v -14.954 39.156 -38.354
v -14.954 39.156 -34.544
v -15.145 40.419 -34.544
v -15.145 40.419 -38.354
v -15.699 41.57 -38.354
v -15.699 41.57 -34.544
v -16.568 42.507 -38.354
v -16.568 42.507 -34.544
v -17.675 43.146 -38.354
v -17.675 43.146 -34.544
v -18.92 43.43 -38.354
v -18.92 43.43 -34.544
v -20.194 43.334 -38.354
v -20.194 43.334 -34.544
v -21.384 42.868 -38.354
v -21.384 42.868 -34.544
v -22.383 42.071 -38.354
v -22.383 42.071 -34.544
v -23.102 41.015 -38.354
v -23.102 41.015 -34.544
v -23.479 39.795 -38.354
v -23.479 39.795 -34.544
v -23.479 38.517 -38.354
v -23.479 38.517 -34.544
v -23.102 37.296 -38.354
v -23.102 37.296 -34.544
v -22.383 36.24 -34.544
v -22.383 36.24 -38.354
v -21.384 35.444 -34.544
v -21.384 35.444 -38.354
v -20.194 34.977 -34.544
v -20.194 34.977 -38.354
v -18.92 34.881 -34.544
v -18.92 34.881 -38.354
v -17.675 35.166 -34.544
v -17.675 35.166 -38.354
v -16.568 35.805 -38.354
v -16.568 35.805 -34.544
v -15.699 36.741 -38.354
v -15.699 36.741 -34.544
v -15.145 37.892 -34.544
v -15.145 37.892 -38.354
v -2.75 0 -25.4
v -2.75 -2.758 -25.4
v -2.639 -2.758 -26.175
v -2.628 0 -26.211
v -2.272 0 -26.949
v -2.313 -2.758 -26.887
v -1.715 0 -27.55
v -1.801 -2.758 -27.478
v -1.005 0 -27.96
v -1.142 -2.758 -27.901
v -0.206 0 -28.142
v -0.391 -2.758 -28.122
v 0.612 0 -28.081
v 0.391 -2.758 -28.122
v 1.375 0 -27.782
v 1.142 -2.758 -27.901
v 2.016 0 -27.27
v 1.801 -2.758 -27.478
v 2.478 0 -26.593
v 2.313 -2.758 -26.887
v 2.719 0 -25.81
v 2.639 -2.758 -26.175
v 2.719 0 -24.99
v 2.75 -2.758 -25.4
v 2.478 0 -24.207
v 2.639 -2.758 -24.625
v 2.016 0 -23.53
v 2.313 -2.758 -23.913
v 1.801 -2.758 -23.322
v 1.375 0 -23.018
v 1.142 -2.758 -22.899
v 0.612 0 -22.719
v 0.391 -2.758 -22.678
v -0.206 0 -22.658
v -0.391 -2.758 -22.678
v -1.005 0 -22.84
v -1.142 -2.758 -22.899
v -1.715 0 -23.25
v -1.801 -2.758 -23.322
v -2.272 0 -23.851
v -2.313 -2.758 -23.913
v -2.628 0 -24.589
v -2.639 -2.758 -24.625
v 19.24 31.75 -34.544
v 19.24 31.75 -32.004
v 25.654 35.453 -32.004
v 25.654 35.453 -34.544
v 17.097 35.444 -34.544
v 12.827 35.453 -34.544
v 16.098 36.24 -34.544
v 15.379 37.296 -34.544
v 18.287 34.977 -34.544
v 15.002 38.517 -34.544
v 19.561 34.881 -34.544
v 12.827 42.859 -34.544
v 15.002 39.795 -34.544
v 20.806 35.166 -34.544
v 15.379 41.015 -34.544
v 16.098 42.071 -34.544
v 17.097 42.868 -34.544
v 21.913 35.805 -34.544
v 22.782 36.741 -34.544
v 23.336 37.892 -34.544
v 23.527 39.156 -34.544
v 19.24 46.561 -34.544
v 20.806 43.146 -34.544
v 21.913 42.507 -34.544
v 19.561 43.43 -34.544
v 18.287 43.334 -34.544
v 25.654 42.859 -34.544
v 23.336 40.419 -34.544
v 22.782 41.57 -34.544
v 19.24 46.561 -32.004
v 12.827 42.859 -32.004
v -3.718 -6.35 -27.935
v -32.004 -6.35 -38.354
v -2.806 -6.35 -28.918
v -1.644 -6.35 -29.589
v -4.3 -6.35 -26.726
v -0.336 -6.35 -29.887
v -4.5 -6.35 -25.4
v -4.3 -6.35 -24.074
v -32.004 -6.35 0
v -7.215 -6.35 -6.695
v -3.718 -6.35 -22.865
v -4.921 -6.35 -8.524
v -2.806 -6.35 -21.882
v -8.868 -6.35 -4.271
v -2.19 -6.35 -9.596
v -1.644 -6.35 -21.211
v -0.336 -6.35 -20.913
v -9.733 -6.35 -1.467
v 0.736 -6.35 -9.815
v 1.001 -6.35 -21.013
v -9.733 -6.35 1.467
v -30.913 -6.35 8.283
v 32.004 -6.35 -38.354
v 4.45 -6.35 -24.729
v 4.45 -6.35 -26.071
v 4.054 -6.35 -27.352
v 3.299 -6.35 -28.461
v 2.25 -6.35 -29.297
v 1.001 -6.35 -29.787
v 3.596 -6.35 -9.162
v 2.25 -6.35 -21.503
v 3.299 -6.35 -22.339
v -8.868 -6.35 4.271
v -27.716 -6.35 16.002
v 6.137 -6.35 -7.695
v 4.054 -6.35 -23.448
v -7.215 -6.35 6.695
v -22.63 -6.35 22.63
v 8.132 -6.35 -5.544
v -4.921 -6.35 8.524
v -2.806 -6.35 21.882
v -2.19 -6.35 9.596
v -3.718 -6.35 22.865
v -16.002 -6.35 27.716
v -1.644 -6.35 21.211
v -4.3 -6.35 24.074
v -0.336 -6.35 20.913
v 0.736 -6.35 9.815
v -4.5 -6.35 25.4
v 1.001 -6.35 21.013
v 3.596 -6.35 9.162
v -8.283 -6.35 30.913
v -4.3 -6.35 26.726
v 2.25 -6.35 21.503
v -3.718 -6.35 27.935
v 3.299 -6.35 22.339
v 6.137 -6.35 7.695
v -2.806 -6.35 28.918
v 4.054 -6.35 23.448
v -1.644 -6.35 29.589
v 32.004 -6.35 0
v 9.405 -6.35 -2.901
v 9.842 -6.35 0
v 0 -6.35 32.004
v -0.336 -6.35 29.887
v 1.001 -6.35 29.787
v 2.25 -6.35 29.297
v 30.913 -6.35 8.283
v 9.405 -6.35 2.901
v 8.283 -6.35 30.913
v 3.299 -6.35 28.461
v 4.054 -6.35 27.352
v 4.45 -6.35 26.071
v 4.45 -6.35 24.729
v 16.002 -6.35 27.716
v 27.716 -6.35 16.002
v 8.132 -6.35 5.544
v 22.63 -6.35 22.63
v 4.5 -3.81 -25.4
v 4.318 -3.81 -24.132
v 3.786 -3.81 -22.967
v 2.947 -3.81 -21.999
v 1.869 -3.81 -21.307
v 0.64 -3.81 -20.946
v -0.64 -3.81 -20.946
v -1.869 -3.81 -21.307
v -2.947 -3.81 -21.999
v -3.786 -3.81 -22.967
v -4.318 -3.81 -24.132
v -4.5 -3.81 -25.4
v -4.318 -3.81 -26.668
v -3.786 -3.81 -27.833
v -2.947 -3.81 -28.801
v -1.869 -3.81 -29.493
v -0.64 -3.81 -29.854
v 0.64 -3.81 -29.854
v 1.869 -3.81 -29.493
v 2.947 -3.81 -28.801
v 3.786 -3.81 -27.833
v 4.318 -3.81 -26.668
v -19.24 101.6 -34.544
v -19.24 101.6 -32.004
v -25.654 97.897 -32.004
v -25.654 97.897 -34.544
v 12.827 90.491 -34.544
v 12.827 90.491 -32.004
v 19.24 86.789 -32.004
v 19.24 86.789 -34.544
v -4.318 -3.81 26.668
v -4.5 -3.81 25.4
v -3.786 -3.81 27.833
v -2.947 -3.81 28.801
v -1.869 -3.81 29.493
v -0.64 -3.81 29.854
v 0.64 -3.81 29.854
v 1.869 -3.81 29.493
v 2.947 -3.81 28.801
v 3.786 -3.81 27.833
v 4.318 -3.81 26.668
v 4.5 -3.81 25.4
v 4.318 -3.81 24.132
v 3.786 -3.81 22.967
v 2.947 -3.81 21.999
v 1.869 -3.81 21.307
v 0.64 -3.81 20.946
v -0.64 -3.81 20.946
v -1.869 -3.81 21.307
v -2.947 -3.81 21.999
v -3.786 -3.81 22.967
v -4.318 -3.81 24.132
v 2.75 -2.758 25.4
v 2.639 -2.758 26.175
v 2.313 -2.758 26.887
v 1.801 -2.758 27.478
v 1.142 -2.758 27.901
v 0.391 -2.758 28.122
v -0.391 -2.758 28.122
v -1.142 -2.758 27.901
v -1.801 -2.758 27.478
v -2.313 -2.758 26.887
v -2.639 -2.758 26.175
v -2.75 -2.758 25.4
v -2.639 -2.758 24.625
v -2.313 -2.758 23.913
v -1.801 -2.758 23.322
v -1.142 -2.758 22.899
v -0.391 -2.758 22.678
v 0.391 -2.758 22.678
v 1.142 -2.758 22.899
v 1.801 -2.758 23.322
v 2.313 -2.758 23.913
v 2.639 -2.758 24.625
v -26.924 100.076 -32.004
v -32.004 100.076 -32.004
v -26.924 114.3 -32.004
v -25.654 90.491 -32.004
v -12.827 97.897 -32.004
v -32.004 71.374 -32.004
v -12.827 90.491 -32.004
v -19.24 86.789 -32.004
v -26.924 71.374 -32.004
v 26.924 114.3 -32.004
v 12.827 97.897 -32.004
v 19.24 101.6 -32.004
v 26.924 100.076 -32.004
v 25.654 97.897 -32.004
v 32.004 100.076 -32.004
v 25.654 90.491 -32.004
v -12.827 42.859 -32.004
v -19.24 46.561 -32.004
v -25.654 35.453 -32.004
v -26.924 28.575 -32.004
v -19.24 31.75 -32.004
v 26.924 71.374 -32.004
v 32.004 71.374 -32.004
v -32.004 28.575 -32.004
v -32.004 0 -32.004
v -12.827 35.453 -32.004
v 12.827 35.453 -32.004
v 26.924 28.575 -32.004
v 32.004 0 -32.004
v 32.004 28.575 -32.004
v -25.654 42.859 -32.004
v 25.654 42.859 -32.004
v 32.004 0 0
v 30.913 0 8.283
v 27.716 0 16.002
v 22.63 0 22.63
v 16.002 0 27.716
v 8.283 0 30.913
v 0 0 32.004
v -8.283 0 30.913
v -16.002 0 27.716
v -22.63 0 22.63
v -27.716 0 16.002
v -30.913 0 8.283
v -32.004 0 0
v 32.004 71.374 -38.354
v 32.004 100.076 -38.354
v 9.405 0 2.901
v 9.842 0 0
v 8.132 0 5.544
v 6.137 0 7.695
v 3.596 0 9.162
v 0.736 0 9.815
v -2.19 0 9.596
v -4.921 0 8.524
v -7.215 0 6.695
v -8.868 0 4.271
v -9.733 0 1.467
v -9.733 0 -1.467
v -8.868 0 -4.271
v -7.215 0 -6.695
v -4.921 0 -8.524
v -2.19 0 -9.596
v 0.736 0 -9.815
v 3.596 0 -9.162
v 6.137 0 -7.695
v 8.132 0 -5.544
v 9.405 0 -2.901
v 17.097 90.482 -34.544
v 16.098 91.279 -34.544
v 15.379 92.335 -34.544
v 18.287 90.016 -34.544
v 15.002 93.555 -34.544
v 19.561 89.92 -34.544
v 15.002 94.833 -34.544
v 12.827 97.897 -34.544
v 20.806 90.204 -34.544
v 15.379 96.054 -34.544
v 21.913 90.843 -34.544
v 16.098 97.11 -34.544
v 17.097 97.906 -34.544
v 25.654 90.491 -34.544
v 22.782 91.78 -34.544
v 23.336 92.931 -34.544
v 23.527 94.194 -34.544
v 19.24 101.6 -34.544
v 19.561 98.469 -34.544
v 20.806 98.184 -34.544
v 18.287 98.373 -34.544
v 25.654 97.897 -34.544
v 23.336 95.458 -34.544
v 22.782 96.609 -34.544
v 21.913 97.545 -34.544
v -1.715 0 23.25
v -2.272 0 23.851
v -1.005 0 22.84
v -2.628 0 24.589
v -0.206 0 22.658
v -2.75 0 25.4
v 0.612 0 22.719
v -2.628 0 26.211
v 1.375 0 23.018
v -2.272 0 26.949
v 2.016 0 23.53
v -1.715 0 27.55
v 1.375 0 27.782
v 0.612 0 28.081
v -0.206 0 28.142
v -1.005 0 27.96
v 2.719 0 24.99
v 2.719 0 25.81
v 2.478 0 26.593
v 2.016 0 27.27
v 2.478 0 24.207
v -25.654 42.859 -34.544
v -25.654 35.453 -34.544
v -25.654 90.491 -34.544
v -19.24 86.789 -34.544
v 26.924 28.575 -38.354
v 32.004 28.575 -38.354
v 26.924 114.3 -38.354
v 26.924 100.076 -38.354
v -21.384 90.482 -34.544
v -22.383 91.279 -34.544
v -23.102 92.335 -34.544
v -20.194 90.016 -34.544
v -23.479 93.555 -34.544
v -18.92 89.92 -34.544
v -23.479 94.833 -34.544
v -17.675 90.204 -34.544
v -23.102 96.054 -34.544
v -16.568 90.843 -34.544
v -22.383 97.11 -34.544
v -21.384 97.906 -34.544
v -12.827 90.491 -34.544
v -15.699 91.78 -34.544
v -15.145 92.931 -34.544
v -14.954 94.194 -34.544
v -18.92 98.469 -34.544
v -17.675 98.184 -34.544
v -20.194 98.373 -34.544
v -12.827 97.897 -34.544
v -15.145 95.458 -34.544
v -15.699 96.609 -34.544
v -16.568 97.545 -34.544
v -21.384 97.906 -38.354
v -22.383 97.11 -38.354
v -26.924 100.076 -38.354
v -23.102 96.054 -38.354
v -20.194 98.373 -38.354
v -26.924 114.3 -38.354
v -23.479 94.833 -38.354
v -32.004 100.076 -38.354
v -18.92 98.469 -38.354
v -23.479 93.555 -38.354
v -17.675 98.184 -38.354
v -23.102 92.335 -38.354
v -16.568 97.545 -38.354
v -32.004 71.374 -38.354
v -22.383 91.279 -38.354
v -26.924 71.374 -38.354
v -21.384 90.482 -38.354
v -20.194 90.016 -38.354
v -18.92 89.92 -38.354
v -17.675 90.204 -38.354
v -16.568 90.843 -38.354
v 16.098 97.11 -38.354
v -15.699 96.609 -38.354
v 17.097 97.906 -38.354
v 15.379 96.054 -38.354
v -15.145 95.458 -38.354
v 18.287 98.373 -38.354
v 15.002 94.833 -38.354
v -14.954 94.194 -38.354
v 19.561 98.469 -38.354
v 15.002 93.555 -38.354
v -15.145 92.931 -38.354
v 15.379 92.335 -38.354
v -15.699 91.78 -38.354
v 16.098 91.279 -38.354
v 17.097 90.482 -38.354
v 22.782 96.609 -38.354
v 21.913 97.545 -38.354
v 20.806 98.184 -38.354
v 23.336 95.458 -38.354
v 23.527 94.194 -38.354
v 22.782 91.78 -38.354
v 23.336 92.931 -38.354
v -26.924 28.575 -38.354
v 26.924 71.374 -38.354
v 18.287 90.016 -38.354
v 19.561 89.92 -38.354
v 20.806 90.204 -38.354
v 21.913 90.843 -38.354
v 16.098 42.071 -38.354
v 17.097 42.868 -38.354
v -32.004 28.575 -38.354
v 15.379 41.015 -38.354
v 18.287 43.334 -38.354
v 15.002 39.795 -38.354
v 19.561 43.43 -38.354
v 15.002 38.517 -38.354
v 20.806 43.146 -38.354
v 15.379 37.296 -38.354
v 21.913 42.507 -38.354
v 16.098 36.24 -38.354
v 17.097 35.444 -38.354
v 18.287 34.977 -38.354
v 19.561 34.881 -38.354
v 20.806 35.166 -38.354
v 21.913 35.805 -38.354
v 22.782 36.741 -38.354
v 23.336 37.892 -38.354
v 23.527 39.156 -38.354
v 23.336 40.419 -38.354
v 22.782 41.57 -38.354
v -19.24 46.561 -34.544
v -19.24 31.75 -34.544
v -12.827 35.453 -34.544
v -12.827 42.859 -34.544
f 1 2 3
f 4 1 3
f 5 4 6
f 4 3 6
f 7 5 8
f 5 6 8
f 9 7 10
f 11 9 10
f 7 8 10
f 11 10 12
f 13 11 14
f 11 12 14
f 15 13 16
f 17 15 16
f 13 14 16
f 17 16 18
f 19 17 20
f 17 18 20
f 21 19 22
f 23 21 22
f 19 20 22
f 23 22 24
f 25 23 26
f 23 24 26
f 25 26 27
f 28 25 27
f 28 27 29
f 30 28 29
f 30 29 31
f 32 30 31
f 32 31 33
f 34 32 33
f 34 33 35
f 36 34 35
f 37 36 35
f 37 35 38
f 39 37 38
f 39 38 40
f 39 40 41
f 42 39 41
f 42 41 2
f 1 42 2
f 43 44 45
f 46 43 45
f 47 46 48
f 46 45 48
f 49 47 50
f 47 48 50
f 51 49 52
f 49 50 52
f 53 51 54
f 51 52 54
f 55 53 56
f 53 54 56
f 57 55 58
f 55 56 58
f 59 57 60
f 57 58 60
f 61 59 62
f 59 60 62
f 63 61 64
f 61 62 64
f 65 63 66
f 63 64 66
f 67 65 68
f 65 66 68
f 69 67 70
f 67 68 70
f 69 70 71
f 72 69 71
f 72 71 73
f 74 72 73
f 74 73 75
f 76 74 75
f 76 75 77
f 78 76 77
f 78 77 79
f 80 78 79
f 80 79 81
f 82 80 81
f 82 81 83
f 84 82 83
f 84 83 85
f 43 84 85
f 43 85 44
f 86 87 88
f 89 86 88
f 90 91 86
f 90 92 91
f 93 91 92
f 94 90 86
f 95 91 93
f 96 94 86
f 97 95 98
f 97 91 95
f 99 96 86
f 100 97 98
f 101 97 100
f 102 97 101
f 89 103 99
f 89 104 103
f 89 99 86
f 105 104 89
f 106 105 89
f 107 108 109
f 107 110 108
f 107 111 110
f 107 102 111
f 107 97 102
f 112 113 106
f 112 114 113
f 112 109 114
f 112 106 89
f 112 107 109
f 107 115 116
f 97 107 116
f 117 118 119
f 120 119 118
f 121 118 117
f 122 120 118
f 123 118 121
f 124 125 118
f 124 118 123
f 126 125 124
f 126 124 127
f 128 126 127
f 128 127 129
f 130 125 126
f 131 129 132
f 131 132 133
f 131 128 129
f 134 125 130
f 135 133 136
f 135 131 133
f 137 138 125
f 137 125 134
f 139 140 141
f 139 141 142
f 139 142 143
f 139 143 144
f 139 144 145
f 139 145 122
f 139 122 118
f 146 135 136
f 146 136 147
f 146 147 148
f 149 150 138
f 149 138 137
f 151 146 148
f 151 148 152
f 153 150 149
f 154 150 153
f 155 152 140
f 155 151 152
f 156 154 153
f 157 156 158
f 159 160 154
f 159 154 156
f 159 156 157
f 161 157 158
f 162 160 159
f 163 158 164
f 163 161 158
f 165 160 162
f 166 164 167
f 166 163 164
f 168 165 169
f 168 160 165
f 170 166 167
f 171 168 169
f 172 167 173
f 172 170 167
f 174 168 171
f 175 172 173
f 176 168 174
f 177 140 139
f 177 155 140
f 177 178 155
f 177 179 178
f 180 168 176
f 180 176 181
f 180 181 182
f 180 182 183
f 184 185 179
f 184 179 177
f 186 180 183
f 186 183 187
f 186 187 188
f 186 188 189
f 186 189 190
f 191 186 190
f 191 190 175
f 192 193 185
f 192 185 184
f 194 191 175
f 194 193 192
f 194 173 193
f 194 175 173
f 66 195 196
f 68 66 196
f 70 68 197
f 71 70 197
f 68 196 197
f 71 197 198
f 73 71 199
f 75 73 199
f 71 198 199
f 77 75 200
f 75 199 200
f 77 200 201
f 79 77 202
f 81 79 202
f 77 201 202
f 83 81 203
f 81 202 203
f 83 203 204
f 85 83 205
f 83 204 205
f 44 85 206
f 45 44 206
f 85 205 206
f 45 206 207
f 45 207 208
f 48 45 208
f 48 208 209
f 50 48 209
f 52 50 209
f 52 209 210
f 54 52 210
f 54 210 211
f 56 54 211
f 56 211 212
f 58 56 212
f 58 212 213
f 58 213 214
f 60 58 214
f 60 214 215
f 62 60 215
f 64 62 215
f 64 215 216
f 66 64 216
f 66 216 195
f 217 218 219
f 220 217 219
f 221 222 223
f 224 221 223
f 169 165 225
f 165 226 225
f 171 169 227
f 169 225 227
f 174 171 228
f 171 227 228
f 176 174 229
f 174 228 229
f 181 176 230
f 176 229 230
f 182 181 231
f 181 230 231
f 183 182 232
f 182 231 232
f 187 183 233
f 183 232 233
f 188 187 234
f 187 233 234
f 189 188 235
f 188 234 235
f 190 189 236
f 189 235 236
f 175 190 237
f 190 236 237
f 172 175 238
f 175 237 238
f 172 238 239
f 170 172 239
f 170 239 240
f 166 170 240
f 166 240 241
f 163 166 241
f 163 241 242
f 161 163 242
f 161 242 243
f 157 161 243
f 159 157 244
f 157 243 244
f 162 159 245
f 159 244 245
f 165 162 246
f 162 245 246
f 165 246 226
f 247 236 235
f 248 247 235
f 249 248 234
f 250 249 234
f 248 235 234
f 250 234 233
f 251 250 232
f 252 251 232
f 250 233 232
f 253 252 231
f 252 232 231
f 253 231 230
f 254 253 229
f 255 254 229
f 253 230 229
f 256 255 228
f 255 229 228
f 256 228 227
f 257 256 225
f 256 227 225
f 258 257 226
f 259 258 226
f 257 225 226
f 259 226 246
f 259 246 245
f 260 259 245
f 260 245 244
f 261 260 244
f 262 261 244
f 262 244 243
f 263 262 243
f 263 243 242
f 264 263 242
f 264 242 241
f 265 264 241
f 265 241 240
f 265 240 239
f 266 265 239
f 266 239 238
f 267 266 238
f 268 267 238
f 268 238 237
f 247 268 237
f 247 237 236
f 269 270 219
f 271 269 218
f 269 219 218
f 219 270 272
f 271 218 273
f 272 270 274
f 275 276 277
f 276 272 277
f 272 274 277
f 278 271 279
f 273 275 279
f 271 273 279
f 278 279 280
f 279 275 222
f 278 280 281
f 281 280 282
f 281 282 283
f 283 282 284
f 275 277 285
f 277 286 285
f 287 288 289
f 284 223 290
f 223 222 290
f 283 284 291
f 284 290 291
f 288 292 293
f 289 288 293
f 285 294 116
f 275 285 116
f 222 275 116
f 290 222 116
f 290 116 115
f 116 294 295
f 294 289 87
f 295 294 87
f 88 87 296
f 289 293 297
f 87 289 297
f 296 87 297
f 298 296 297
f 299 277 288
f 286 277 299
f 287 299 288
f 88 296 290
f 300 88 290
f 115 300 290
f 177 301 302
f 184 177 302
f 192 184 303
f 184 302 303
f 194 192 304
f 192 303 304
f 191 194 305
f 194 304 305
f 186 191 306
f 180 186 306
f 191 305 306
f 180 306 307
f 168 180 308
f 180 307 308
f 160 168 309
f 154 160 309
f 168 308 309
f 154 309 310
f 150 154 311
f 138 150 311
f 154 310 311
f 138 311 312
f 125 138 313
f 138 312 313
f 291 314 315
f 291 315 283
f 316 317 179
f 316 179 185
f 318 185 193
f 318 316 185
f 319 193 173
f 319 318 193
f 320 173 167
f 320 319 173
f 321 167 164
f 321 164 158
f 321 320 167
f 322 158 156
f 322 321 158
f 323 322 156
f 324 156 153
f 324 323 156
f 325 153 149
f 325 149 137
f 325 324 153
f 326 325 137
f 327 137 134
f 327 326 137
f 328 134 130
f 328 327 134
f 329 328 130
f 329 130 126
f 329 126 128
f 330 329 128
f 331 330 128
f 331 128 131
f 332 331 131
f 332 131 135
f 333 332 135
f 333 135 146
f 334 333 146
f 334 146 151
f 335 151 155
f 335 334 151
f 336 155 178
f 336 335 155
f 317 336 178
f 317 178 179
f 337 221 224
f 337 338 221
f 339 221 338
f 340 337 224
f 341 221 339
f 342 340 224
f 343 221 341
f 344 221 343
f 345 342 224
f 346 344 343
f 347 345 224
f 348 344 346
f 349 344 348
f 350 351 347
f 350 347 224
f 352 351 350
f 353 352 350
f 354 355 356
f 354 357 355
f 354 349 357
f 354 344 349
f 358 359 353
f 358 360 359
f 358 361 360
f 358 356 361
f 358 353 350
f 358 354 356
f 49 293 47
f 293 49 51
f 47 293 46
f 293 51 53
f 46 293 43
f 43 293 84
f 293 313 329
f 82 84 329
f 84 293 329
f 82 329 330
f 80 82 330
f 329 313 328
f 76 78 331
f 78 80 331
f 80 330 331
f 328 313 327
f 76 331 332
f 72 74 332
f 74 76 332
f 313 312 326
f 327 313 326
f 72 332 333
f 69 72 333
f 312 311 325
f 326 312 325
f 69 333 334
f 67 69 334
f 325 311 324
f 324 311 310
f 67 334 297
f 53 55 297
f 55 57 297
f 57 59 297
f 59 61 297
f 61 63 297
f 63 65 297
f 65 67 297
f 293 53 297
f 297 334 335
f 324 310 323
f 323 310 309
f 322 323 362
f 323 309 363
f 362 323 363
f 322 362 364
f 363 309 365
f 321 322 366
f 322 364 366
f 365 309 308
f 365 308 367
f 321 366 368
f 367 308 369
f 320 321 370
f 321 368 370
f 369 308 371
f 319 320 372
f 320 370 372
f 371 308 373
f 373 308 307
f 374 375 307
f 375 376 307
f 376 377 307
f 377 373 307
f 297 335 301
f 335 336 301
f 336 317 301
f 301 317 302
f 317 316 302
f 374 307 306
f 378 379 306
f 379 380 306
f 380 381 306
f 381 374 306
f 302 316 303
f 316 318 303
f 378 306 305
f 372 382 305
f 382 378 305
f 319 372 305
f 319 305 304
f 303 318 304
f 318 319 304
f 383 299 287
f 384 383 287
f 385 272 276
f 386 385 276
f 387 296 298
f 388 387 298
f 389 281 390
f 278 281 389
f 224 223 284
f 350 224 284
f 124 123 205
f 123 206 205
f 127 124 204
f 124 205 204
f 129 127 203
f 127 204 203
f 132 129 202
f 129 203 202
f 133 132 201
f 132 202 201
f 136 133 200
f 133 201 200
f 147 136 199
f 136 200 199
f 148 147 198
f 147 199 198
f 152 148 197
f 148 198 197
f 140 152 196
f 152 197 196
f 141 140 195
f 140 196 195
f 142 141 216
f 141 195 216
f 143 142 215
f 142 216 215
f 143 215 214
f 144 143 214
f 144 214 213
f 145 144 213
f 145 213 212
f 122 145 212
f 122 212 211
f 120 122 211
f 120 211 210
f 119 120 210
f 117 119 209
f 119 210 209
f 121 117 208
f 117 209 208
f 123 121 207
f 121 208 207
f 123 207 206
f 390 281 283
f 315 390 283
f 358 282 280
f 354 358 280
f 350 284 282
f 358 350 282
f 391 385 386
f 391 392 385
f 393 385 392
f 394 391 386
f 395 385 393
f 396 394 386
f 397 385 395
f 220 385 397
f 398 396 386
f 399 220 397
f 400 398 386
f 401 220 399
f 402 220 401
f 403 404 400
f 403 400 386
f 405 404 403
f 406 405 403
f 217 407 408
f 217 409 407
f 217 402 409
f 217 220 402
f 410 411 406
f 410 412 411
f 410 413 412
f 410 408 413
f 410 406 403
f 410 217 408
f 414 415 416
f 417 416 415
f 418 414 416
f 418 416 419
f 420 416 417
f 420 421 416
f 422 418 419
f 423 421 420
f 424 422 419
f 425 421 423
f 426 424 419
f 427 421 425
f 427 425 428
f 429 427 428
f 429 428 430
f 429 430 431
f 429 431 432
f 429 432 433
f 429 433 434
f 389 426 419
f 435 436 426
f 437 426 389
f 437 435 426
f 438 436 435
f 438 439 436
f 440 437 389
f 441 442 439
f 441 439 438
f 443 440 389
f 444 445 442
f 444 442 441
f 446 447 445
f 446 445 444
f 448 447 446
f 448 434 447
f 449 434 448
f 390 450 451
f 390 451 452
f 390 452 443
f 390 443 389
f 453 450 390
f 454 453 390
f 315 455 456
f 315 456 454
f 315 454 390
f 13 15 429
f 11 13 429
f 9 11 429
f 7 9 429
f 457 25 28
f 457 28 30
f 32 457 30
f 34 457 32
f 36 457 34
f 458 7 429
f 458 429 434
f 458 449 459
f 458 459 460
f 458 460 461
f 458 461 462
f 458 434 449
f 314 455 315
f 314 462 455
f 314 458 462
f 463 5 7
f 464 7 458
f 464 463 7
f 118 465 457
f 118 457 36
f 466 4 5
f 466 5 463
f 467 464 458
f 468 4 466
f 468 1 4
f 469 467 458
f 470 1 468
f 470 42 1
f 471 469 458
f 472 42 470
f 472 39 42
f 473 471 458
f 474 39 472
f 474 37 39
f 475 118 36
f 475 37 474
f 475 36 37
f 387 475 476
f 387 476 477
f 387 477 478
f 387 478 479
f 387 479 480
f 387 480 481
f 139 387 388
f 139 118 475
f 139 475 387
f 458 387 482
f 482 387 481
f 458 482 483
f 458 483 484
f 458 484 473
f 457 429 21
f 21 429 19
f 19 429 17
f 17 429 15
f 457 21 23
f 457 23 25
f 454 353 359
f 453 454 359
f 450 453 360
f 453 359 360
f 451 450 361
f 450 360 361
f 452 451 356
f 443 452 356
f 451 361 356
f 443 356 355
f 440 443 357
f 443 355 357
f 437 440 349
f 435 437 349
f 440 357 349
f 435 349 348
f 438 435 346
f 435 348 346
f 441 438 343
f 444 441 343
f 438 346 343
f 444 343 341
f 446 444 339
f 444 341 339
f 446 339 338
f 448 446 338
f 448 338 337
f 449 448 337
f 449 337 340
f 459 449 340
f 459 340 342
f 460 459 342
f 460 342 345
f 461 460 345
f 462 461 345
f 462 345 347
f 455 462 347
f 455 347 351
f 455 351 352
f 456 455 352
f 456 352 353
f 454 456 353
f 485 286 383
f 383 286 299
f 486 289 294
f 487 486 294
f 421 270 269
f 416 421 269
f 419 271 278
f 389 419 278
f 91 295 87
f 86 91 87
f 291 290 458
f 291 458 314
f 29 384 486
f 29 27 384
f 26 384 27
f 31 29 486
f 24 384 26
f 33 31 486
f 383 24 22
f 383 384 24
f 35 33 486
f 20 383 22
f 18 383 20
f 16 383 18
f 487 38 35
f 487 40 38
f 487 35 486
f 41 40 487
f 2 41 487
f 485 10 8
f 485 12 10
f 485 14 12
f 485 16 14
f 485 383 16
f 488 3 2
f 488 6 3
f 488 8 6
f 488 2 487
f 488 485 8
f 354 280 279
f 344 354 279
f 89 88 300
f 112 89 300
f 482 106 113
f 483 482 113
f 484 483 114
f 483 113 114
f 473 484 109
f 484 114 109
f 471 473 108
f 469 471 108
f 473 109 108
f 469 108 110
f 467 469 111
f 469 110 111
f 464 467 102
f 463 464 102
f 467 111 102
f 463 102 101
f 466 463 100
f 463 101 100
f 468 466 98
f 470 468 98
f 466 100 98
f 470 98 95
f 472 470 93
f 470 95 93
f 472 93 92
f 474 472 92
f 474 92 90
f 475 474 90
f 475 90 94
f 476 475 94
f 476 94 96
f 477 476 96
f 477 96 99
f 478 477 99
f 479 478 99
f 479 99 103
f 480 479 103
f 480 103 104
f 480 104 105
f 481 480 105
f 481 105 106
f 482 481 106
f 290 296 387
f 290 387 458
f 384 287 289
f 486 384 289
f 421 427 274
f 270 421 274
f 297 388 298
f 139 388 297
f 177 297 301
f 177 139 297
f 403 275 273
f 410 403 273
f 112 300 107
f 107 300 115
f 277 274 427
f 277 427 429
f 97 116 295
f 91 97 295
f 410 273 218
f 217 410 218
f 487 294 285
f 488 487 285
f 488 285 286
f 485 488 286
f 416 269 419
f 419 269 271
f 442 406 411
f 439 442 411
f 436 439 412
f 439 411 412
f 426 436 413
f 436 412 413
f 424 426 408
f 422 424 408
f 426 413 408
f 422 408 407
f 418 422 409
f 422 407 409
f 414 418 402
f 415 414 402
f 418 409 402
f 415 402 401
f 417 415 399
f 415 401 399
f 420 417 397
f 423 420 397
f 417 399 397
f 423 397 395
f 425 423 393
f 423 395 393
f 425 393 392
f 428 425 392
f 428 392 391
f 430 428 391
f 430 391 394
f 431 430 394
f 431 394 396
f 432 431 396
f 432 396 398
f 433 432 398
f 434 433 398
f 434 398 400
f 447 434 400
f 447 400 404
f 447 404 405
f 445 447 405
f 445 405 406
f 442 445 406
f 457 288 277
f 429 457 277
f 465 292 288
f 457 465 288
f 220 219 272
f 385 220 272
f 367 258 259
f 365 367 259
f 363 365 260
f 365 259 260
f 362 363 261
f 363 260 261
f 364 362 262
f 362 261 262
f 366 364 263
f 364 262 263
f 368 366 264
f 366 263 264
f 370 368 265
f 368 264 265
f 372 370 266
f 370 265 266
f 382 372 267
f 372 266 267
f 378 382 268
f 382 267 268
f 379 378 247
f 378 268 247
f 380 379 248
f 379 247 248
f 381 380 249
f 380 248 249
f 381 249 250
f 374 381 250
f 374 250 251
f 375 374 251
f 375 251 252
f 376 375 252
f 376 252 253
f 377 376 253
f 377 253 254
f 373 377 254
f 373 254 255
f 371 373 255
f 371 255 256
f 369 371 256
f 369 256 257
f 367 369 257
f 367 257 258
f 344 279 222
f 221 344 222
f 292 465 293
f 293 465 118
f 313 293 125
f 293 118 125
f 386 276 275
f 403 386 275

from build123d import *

# Parameters (mm, degrees)
F0_R     = 9.8425
F0_W     = 64.008
F0_H     = 6.35
F1_DEPTH = 6.35
F2_DEPTH = 114.3
F3_D     = 5.5
F4_R     = 4.28625
F5_DEPTH = 2.54
F6_DEPTH = 6.351
F4_W     = 5.08
F4_H     = 14.224
F4_H_2   = 42.799
F7_DEPTH = 6.351
F9_D     = 9
F9_DEPTH = 2.54
F9_TIP   = 2.7038727856


with BuildPart() as f1:
    # F0 (on Front) → F1 (new body)
    with BuildSketch(Plane.XZ):
        with BuildLine():
            Line((32.004, -32.004), (32.004, 0))
            ThreePointArc((32.004, 0), (0, 32.004), (-32.004, 0))
            Line((-32.004, 0), (-32.004, -32.004))
            Line((-32.004, -32.004), (32.004, -32.004))
        make_face()
        Circle(F0_R, mode=Mode.SUBTRACT)
        with Locations((0, -35.179)):
            Rectangle(F0_W, F0_H)
    extrude(amount=F1_DEPTH)

    # F0 (on Front) → F2 (join)
    with BuildSketch(Plane.XZ):
        with Locations((0, -35.179)):
            Rectangle(F0_W, F0_H)
    extrude(amount=-F2_DEPTH)

    # F3 (through all)
    with Locations(Plane(origin=(0, 0, 0), x_dir=(1, 0, 0), z_dir=(0, 1, 0))):
        with Locations((0, -25.4), (0, 25.4)):
            Hole(F3_D / 2)

    # F4 (on face) → F5 (cut)
    with BuildSketch(Plane.XY.offset(-32.004)):
        Polygon((-12.827, 90.4914921457), (-12.827, 97.8971640486), (-19.2405, 101.6), (-25.654, 97.8971640486), (-25.654, 90.4914921457), (-19.2405, 86.7886561942), align=None)
        with Locations((-19.2405, 94.1943280971)):
            Circle(F4_R, mode=Mode.SUBTRACT)
        Polygon((25.654, 90.4914921457), (25.654, 97.8971640486), (19.2405, 101.6), (12.827, 97.8971640486), (12.827, 90.4914921457), (19.2405, 86.7886561942), align=None)
        with Locations((19.2405, 94.1943280971)):
            Circle(F4_R, mode=Mode.SUBTRACT)
        Polygon((25.654, 35.4528359514), (25.654, 42.8585078543), (19.2405, 46.5613438058), (12.827, 42.8585078543), (12.827, 35.4528359514), (19.2405, 31.75), align=None)
        with Locations((19.2405, 39.1556719029)):
            Circle(F4_R, mode=Mode.SUBTRACT)
        Polygon((-12.827, 35.4528359514), (-12.827, 42.8585078543), (-19.2405, 46.5613438058), (-25.654, 42.8585078543), (-25.654, 35.4528359514), (-19.2405, 31.75), align=None)
        with Locations((-19.2405, 39.1556719029)):
            Circle(F4_R, mode=Mode.SUBTRACT)
    extrude(amount=-F5_DEPTH, mode=Mode.SUBTRACT)

    # F6 (cut, through all): faces of the model
    f6_faces = [f1.faces().sort_by_distance(p)[0] for p in [
        (-19.2405, 94.1943280971, -32.004),
        (19.2405, 94.1943280971, -32.004),
        (19.2405, 39.1556719029, -32.004),
        (-19.2405, 39.1556719029, -32.004),
    ]]
    extrude(f6_faces, amount=-F6_DEPTH, mode=Mode.SUBTRACT)

    # F4 (on face) → F7 (cut, through all)
    with BuildSketch(Plane.XY.offset(-32.004)):
        with Locations((29.464, 107.188)):
            Rectangle(F4_W, F4_H)
        with Locations((29.464, 49.9745)):
            Rectangle(F4_W, F4_H_2)
        with Locations((-29.464, 107.188)):
            Rectangle(F4_W, F4_H)
        with Locations((-29.464, 49.9745)):
            Rectangle(F4_W, F4_H_2)
    extrude(amount=-F7_DEPTH, mode=Mode.SUBTRACT)

    # F9
    with Locations(Plane.XZ.offset(6.35)):
        with Locations((0, 25.4), (0, -25.4)):
            Hole(F9_D / 2, depth=F9_DEPTH)
            with Locations((0, 0, -(F9_DEPTH + F9_TIP / 2))):  # 118° drill point
                Cone(0, F9_D / 2, F9_TIP, mode=Mode.SUBTRACT)


solid = f1.part
